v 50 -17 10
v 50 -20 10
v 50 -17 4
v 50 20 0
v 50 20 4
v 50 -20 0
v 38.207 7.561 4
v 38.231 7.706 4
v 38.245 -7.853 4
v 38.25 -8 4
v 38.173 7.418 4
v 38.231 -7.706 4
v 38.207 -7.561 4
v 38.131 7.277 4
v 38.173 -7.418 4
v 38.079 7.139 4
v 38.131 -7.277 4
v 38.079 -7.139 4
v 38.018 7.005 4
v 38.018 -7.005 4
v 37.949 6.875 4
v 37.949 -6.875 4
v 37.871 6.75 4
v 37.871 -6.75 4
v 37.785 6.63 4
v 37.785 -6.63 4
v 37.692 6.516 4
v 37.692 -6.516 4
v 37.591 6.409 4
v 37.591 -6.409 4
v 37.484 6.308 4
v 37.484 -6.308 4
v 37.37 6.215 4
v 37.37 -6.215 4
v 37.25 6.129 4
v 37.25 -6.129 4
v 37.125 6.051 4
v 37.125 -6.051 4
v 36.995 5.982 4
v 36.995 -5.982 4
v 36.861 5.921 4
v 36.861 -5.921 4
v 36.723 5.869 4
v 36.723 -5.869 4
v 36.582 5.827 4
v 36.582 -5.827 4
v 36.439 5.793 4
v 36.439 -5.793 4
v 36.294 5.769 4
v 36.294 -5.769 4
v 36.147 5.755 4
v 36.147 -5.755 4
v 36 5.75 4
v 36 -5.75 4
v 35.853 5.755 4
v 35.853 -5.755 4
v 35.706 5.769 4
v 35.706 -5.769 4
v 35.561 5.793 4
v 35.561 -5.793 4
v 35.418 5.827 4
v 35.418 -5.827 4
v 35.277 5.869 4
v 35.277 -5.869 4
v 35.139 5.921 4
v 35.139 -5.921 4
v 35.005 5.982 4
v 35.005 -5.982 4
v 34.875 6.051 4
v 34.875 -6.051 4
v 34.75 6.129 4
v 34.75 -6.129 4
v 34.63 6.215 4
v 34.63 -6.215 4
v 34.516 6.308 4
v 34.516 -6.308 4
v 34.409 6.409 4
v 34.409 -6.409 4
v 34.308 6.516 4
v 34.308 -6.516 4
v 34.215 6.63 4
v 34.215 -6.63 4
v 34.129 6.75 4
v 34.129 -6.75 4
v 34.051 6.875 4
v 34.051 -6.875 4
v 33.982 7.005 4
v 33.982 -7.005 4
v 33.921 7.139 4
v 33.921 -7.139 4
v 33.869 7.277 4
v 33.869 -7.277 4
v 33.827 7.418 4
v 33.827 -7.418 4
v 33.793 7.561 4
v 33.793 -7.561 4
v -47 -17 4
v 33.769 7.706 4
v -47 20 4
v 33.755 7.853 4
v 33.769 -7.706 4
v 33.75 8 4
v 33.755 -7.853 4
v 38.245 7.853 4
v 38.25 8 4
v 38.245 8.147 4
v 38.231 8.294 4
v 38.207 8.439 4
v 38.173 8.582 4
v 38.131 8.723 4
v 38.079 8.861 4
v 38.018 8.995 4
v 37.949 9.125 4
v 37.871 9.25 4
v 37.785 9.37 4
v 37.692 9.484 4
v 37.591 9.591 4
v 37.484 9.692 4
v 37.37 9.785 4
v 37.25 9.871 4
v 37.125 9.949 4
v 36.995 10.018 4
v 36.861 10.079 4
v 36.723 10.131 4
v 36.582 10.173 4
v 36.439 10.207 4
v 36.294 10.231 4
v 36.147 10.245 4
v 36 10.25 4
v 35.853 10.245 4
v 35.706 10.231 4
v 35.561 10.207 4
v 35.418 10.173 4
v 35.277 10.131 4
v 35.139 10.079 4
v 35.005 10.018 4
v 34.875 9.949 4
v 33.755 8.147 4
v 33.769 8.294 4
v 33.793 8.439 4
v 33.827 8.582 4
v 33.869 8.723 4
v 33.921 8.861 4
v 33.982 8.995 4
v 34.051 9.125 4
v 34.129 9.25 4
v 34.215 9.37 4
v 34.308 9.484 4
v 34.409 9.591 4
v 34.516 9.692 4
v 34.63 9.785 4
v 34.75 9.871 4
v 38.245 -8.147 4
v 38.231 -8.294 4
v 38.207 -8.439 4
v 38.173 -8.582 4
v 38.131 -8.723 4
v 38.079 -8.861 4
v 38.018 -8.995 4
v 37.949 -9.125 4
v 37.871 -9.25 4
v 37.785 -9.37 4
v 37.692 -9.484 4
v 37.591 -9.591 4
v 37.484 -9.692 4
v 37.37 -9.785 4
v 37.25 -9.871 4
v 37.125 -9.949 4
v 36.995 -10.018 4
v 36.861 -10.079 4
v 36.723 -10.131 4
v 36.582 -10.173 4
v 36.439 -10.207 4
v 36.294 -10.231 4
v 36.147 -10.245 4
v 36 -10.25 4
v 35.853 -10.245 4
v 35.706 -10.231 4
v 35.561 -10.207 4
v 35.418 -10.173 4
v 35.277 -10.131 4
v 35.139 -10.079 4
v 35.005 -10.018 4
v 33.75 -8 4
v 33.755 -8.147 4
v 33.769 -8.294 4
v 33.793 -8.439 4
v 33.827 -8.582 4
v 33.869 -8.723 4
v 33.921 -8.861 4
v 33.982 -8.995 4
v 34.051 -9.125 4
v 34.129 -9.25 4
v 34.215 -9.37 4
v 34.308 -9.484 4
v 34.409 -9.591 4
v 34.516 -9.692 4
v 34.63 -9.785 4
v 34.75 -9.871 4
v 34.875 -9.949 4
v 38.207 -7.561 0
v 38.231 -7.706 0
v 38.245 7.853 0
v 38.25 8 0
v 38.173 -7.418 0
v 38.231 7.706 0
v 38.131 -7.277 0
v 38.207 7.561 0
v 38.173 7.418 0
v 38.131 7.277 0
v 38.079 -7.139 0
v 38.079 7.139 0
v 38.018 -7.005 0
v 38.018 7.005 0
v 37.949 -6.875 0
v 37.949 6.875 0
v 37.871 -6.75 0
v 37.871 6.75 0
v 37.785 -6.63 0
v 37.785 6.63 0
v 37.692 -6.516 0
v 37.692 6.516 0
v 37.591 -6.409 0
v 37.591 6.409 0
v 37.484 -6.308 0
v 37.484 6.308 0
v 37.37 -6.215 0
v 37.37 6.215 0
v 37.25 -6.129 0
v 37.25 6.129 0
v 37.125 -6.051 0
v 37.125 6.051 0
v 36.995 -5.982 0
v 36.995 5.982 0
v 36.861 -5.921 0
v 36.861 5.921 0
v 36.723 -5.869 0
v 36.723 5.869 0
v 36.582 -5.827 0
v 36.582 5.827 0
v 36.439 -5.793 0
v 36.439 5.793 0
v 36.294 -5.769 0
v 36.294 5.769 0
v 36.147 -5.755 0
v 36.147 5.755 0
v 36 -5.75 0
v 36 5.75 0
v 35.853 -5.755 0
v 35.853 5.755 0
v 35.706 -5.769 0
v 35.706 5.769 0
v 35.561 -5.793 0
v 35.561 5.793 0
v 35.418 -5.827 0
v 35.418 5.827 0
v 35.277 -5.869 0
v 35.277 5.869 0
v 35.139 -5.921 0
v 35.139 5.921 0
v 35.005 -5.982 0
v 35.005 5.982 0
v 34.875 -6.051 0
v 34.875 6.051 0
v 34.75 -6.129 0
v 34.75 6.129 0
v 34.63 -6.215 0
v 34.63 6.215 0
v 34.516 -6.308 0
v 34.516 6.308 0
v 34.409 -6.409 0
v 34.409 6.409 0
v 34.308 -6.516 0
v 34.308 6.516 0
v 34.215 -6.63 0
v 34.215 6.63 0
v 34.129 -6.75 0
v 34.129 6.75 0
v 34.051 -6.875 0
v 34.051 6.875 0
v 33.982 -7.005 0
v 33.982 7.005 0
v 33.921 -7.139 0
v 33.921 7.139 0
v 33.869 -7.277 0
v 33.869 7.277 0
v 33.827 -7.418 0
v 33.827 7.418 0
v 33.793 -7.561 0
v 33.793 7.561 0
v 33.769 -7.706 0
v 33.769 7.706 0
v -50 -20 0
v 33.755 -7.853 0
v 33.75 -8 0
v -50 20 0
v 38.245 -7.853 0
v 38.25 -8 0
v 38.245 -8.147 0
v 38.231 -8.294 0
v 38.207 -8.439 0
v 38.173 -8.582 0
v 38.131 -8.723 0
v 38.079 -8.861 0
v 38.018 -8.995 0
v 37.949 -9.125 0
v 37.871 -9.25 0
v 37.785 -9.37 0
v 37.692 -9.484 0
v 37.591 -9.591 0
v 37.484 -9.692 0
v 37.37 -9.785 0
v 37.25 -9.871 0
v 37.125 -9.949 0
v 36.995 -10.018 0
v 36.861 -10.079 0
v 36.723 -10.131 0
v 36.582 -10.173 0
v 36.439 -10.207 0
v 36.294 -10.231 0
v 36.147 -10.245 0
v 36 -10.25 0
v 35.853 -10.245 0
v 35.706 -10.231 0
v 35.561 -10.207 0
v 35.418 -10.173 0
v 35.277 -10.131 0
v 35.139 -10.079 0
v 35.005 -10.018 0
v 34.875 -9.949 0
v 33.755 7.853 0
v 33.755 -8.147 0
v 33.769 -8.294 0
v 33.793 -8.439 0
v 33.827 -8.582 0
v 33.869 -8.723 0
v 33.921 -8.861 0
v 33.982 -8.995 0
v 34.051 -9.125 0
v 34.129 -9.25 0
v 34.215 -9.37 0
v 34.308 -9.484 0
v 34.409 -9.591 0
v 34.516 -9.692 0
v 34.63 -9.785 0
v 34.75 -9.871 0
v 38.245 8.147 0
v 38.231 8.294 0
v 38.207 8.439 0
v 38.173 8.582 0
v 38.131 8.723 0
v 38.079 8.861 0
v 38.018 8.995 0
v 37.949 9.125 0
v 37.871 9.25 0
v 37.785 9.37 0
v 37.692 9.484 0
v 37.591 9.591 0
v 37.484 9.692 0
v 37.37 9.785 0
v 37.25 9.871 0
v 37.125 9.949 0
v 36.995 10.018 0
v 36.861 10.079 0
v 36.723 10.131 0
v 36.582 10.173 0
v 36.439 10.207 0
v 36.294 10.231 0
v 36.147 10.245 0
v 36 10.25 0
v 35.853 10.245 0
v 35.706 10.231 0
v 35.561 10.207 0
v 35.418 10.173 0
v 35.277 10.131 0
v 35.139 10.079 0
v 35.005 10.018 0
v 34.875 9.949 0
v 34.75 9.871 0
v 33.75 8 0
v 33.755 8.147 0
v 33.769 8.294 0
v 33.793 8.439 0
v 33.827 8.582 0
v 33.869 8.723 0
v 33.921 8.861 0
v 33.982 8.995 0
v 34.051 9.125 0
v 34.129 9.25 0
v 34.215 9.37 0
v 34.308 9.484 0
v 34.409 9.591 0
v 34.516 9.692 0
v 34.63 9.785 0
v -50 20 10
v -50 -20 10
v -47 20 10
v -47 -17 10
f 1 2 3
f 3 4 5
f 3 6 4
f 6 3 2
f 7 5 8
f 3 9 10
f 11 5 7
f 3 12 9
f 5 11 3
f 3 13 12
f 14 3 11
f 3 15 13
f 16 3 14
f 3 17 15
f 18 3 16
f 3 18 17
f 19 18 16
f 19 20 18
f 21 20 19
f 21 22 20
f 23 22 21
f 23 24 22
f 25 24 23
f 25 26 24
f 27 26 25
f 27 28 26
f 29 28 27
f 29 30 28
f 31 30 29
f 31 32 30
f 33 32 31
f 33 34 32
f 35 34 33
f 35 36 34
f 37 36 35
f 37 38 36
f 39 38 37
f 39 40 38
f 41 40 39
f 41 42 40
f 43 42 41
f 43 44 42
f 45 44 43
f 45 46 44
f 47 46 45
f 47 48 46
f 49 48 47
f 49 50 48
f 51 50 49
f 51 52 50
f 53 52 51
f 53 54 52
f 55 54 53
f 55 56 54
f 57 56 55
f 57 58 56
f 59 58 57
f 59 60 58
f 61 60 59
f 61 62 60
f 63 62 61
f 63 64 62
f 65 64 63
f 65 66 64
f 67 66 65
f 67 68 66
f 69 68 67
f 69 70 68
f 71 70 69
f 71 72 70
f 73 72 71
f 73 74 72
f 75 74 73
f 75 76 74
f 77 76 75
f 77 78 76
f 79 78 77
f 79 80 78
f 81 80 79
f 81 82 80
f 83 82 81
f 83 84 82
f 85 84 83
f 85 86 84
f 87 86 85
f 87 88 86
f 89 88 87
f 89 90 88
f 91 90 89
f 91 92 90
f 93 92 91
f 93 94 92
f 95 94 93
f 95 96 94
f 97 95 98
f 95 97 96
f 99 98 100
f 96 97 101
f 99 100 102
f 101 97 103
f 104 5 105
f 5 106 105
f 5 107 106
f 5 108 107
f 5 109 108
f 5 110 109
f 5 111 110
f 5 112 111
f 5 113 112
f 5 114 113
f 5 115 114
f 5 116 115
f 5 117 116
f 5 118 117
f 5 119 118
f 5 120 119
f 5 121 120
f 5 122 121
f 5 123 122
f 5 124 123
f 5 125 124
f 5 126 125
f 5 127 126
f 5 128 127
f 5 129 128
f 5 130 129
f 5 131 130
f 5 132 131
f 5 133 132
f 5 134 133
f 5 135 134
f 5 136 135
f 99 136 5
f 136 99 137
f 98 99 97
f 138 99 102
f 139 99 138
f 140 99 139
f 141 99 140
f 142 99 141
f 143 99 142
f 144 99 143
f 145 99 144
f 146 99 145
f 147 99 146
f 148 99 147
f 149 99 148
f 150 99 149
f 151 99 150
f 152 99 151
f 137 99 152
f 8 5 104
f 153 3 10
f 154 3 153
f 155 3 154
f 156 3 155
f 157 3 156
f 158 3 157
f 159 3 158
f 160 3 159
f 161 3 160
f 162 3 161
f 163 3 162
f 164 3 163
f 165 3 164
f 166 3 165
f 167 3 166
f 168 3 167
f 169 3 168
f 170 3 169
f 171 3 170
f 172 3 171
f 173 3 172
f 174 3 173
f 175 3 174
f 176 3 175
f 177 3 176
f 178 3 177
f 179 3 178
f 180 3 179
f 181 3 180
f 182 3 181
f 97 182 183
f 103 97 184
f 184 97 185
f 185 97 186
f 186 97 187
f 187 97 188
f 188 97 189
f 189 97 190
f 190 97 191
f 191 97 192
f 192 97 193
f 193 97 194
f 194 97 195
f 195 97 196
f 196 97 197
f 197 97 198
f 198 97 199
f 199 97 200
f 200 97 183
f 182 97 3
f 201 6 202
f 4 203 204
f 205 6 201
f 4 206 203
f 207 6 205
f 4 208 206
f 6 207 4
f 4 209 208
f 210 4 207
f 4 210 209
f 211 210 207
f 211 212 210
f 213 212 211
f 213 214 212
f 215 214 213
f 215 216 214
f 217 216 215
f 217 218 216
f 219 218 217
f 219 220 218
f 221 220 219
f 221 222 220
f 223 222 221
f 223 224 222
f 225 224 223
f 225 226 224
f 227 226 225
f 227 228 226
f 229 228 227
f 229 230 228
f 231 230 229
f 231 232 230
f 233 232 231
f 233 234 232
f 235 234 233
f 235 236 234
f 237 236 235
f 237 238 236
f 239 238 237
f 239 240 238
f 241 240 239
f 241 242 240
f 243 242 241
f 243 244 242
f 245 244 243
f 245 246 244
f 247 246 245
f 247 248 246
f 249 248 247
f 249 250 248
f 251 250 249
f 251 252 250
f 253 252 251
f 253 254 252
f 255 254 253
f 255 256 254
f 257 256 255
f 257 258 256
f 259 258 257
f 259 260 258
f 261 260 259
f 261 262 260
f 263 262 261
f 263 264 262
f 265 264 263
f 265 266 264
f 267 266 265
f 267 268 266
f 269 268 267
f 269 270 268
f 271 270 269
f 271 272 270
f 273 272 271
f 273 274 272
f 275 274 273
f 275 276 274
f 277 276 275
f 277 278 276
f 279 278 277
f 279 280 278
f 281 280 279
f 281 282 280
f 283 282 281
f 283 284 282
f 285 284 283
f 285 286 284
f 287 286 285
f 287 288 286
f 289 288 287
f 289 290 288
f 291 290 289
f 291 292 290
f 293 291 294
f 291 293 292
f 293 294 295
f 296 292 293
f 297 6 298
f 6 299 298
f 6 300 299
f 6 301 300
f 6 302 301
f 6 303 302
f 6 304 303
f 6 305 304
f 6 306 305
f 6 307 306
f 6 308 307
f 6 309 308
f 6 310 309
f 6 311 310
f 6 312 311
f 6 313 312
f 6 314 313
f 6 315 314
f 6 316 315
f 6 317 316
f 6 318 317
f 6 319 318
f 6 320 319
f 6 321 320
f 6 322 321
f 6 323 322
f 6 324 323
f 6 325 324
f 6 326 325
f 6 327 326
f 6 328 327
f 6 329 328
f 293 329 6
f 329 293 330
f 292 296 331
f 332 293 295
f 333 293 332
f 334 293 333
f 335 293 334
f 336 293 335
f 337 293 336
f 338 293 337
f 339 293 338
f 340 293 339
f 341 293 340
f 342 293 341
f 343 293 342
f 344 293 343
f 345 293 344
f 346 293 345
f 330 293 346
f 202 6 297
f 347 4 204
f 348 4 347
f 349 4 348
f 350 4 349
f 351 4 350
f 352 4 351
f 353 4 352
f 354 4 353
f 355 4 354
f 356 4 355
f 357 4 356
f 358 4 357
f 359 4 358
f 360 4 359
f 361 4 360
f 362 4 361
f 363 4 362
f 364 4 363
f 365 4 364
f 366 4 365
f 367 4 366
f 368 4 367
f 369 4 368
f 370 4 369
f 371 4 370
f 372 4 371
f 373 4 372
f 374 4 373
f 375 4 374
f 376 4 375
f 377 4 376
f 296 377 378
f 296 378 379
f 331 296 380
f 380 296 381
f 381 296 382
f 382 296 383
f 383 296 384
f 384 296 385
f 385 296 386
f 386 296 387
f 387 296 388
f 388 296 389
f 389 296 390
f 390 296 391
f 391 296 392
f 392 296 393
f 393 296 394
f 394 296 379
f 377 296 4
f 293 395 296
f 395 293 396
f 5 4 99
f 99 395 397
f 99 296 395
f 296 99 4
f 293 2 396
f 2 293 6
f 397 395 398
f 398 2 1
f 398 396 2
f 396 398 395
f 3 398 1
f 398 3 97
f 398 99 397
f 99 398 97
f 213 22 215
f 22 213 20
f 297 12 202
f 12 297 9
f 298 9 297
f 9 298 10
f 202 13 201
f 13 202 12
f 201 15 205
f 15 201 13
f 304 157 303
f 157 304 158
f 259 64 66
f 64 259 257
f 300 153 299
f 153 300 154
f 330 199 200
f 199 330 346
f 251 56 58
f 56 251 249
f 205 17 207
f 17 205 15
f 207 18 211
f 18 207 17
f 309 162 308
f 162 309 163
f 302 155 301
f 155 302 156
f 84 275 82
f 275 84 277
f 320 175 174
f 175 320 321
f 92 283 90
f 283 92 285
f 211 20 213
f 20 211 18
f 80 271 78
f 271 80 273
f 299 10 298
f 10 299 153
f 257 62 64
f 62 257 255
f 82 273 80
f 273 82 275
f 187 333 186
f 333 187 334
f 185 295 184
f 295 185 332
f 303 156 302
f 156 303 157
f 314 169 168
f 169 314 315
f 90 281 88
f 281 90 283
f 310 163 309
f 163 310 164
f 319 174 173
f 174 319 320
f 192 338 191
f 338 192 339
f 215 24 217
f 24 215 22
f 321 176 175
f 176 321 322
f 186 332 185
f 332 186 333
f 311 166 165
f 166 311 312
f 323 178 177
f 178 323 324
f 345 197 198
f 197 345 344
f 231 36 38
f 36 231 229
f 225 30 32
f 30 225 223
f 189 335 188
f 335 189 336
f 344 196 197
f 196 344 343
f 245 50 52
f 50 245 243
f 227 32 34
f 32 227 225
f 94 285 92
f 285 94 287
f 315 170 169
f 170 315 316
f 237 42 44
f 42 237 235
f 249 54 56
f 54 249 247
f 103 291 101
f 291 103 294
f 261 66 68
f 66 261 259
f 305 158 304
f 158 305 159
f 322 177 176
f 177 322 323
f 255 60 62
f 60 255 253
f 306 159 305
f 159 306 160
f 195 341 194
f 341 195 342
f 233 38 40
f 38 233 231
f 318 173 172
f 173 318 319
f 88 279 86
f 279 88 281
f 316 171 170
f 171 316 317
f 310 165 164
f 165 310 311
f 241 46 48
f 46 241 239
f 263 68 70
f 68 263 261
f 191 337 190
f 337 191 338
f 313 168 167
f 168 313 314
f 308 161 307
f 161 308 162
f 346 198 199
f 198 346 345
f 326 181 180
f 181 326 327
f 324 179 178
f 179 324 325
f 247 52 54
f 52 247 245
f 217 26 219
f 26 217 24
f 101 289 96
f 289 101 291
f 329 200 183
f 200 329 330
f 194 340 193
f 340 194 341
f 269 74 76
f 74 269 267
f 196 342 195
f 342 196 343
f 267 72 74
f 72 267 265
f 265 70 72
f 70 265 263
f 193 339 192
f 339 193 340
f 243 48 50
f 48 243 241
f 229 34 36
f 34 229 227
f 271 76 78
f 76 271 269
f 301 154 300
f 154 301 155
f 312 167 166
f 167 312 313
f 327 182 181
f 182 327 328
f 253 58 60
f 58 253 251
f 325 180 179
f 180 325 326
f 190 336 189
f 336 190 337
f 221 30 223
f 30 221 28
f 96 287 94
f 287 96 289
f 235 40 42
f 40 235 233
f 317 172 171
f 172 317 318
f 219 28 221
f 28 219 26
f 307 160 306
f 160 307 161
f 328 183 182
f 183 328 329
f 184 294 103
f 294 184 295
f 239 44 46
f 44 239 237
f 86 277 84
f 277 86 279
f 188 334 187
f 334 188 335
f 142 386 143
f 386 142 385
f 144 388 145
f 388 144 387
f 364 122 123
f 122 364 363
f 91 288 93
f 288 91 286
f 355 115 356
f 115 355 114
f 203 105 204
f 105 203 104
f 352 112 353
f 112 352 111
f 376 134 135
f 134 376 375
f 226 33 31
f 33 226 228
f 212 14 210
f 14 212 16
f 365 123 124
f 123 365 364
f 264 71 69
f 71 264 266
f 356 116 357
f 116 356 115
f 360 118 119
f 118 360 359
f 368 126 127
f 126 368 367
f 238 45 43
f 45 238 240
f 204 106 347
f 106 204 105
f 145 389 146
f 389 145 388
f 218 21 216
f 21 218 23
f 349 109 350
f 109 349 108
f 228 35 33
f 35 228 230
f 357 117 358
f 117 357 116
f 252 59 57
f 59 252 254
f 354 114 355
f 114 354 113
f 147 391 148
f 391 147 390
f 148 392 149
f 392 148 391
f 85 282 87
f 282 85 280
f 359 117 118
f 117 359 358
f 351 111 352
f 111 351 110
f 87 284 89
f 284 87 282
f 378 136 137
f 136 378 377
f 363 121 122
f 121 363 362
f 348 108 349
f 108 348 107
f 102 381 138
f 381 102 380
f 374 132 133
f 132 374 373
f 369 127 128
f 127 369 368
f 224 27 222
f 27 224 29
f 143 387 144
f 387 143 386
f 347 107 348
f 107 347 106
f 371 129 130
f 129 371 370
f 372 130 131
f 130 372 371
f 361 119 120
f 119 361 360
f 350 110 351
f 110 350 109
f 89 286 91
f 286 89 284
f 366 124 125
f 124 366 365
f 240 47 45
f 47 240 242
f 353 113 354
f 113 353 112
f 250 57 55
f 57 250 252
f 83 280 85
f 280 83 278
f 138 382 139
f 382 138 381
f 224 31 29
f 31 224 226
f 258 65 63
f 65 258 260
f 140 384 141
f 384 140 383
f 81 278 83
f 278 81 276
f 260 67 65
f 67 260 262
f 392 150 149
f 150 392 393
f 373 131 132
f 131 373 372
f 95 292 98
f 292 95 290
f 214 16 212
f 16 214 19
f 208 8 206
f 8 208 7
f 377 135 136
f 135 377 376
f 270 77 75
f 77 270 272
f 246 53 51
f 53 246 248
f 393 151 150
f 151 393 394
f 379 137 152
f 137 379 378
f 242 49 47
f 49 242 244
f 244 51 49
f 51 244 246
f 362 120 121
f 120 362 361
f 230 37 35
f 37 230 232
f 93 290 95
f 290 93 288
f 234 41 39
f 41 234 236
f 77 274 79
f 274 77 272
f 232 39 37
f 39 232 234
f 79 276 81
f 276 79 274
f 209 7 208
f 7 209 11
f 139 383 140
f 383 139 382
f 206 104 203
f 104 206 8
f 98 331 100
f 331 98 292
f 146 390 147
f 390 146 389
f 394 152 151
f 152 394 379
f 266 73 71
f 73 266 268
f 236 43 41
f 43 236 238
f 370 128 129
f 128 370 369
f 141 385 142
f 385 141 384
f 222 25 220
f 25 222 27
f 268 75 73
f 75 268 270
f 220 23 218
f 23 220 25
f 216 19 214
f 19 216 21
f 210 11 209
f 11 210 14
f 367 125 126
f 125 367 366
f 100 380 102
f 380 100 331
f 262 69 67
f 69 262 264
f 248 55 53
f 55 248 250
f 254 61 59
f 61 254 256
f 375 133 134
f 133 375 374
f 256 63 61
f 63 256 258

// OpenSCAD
// Microscope-slide registration jig with two clamp holes
// Category: benchware; Purpose: repeatable origin when photographing a 75 x 25 mm microscope slide.
// Print: FDM, on the broad bottom face at z=0; no support required.
// This is a geometric reference design; no dimensional fit or lab use has been physically validated.
// SPDX-License-Identifier: CERN-OHL-P-2.0

/* [Platform] */
// Overall platform length, X (mm)
base_l = 100; // 0.5
// Overall platform width, Y (mm)
base_w = 40; // 0.5
// Platform thickness (mm)
base_h = 4; // 0.5

/* [Registration Edges] */
// Width of each perpendicular registration rail (mm)
rail_w = 3; // 0.1
// Height of rails above print bed (mm)
rail_top = 10; // 0.5

/* [Fasteners] */
// Diameter of each right-side mounting hole (mm)
bore_d = 4.5; // 0.1
// X coordinate of the mounting-hole centers (mm)
bore_x = 36; // 0.5
// Absolute Y coordinate of mounting-hole centers (mm)
bore_y = 8; // 0.5

/* [Hidden] */
$fn = 96;
eps = 0.1;
assert(base_l >= 90 && base_w >= 35);
assert(rail_w >= 1.6 && rail_top >= base_h + 2);
assert(bore_d > 0 && bore_d < 8);
assert(bore_x + bore_d/2 < base_l/2 - 1);
assert(bore_x - bore_d/2 > -base_l/2 + rail_w + 1);
assert(bore_y + bore_d/2 < base_w/2 - 1);
assert(bore_y - bore_d/2 > -base_w/2 + rail_w + 1);
assert(bore_d / 2 + 2 < bore_y);

difference() {
    union() {
        translate([-base_l/2, -base_w/2, 0])
            cube([base_l, base_w, base_h]);
        translate([-base_l/2, -base_w/2, base_h])
            cube([base_l, rail_w, rail_top-base_h]);
        translate([-base_l/2, -base_w/2, base_h])
            cube([rail_w, base_w, rail_top-base_h]);
    }
    for (sign=[-1,1])
        translate([bore_x, sign*bore_y, -eps])
            cylinder(h=base_h+2*eps, d=bore_d);
}
